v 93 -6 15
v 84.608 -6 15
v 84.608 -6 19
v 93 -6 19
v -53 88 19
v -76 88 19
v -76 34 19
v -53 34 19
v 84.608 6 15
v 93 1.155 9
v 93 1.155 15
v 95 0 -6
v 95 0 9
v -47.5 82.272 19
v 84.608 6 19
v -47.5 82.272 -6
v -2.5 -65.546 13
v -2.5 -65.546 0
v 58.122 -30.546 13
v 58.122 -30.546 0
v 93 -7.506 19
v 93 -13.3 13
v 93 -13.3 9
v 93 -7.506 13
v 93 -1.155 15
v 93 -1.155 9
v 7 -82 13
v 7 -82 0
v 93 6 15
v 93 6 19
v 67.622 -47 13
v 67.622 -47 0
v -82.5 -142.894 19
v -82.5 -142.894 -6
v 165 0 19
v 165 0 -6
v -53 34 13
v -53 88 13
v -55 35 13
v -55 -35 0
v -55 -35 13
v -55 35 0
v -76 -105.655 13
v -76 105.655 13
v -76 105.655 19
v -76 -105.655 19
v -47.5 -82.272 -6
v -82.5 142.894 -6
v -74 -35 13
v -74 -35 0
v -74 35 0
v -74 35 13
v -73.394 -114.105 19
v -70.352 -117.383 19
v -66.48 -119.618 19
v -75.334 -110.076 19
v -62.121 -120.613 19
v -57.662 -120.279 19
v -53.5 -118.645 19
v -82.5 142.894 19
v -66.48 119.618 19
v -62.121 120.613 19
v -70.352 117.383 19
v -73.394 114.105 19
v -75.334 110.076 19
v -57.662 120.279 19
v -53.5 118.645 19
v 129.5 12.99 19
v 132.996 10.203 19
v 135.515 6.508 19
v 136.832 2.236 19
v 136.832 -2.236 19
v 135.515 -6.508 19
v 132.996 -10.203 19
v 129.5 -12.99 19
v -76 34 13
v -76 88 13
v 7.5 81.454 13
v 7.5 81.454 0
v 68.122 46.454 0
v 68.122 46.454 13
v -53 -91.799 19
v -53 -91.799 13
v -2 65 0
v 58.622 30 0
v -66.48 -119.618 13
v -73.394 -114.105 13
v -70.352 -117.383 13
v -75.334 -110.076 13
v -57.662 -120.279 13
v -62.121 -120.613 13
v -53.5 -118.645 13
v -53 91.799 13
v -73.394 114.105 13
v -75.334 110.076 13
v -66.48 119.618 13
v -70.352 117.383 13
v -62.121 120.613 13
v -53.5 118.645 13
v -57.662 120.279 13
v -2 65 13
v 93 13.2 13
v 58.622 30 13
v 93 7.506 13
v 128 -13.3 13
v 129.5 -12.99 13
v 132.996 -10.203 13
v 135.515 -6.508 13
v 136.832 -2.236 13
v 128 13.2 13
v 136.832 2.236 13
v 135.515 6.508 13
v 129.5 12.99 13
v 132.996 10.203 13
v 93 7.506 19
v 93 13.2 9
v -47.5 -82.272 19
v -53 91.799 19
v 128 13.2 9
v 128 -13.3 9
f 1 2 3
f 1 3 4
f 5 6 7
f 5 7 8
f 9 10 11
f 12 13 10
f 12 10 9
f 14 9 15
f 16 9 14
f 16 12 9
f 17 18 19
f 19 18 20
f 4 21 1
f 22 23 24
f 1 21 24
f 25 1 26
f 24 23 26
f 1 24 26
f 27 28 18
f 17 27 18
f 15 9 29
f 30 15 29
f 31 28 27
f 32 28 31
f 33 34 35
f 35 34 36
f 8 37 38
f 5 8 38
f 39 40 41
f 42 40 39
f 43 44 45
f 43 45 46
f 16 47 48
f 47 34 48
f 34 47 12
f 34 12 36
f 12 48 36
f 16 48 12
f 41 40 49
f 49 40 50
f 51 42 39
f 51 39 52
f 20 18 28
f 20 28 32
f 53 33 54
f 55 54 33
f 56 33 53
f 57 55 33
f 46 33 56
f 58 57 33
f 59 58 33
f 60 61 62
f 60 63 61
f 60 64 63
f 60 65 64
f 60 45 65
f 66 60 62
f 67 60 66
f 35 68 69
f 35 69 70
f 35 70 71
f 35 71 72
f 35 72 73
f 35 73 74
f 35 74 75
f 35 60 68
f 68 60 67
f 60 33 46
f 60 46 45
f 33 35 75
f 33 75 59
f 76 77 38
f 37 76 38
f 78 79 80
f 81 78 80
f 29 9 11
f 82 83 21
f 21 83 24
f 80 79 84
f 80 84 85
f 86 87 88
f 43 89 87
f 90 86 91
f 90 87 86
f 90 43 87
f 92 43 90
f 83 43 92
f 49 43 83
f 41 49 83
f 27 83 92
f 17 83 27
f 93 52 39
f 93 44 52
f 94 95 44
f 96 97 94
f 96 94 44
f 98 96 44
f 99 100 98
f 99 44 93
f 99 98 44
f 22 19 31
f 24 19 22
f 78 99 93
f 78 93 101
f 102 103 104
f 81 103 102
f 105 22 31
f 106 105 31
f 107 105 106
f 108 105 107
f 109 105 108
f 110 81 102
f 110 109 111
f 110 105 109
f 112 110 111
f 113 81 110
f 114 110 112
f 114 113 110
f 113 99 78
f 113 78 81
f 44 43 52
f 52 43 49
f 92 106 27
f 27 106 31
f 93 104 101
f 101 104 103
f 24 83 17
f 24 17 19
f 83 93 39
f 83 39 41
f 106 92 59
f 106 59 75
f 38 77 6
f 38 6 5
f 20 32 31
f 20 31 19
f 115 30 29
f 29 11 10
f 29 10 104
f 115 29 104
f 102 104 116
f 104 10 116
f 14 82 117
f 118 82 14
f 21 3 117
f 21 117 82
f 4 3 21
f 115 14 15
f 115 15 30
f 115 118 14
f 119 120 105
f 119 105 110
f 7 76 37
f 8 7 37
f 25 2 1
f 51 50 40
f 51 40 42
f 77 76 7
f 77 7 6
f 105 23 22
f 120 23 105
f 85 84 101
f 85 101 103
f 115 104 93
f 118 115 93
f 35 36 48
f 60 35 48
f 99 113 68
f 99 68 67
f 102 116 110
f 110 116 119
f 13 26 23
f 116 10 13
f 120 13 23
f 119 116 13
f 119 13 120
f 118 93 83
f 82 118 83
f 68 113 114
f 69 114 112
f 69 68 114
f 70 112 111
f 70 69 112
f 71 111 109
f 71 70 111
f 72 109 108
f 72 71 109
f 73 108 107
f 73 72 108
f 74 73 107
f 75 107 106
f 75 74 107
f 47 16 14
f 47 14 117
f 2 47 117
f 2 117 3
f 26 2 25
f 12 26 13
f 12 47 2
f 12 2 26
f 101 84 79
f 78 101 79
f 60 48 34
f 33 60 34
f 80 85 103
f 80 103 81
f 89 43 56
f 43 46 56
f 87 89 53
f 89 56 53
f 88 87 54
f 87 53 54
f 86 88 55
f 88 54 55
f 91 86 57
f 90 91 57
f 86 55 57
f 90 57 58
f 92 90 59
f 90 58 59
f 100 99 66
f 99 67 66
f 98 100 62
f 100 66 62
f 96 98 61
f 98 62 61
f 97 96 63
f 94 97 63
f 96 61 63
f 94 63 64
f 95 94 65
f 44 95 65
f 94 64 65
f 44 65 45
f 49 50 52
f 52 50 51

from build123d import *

# Parameters (mm, degrees)
BOX005_W               = 23
BOX005_H               = 54
BOX005_DEPTH           = 6
PRISM003_DEPTH         = 6
PRISM002_DEPTH         = 6
BOX004_W               = 10
BOX004_H               = 12
BOX004_DEPTH           = 4
BOX003_W               = 35
BOX003_H               = 26.5
BOX003_DEPTH           = 10
BOX002_W               = 70
BOX002_H               = 19
BOX002_DEPTH           = 19
BOX002_PLACEMENT_ANGLE = 30
BOX001_W               = 70
BOX001_H               = 19
BOX001_DEPTH           = 19
BOX001_PLACEMENT_ANGLE = 90
BOX_W                  = 70
BOX_H                  = 19
BOX_DEPTH              = 19
BOX_PLACEMENT_ANGLE    = 30
PRISM001_DEPTH         = 25
PRISM_DEPTH            = 25
FILLET_R               = 15


with BuildPart() as box005:
    # Box005 → Box005 (new body)
    with BuildSketch(Plane(origin=(-76, 34, 13), x_dir=(1, 0, 0), z_dir=(0, 0, 1))):
        with Locations((11.5, 27)):
            Rectangle(BOX005_W, BOX005_H)
    extrude(amount=BOX005_DEPTH)


with BuildPart() as prism003:
    # Prism003 → Prism003 (new body)
    with BuildSketch(Plane.XY.offset(13)):
        Polygon((106, 0), (-53, 91.798693), (-53, -91.798693), align=None)
    extrude(amount=PRISM003_DEPTH)


with BuildPart() as cut006:
    # Prism002 → Prism002 (new body)
    with BuildSketch(Plane.XY.offset(13)):
        Polygon((152, 0), (-76, 131.635861), (-76, -131.635861), align=None)
    extrude(amount=PRISM002_DEPTH)

    # Cut006: cut Prism003
    add(prism003.part, mode=Mode.SUBTRACT)


with BuildPart() as box004:
    # Box004 → Box004 (new body)
    with BuildSketch(Plane(origin=(84, -6, 15), x_dir=(1, 0, 0), z_dir=(0, 0, 1))):
        with Locations((5, 6)):
            Rectangle(BOX004_W, BOX004_H)
    extrude(amount=BOX004_DEPTH)


with BuildPart() as box003:
    # Box003 → Box003 (new body)
    with BuildSketch(Plane(origin=(93, -13.3, 9), x_dir=(1, 0, 0), z_dir=(0, 0, 1))):
        with Locations((17.5, 13.25)):
            Rectangle(BOX003_W, BOX003_H)
    extrude(amount=BOX003_DEPTH)


with BuildPart() as box002:
    # Box002 → Box002 (new body)
    with BuildSketch(Plane.XY):
        with Locations((35, 9.5)):
            Rectangle(BOX002_W, BOX002_H)
    extrude(amount=BOX002_DEPTH)


with BuildPart() as box002_1:
    # Box002 placement: moved
    add(box002.part.moved(Location((7, -82, 0))).rotate(Axis((7, -82, 0), (0, 0, 1)), BOX002_PLACEMENT_ANGLE))


with BuildPart() as box001:
    # Box001 → Box001 (new body)
    with BuildSketch(Plane.XY):
        with Locations((35, 9.5)):
            Rectangle(BOX001_W, BOX001_H)
    extrude(amount=BOX001_DEPTH)


with BuildPart() as box001_1:
    # Box001 placement: moved
    add(box001.part.moved(Location((-55, -35, 0))).rotate(Axis((-55, -35, 0), (0, 0, 1)), BOX001_PLACEMENT_ANGLE))


with BuildPart() as box:
    # Box → Box (new body)
    with BuildSketch(Plane.XY):
        with Locations((35, 9.5)):
            Rectangle(BOX_W, BOX_H)
    extrude(amount=BOX_DEPTH)


with BuildPart() as box_1:
    # Box placement: moved
    add(box.part.moved(Location((-2, 65, 0))).rotate(Axis((-2, 65, 0), (0, 0, -1)), BOX_PLACEMENT_ANGLE))


with BuildPart() as prism001:
    # Prism001 → Prism001 (new body)
    with BuildSketch(Plane.XY.offset(-6)):
        Polygon((95, 0), (-47.5, 82.272413), (-47.5, -82.272413), align=None)
    extrude(amount=PRISM001_DEPTH)


with BuildPart() as fillet_body:
    # Prism → Prism (new body)
    with BuildSketch(Plane.XY.offset(-6)):
        Polygon((165, 0), (-82.5, 142.894192), (-82.5, -142.894192), align=None)
    extrude(amount=PRISM_DEPTH)

    # Cut: cut Prism001
    add(prism001.part, mode=Mode.SUBTRACT)

    # Cut001: cut Box
    add(box_1.part, mode=Mode.SUBTRACT)

    # Cut002: cut Box001
    add(box001_1.part, mode=Mode.SUBTRACT)

    # Cut003: cut Box002
    add(box002_1.part, mode=Mode.SUBTRACT)

    # Cut004: cut Box003
    add(box003.part, mode=Mode.SUBTRACT)

    # Cut005: cut Box004
    add(box004.part, mode=Mode.SUBTRACT)

    # Cut007: cut Cut006
    add(cut006.part, mode=Mode.SUBTRACT)

    # Fillet
    fillet_edges = [fillet_body.edges().sort_by_distance(p)[0] for p in [
        (152, 0, 16),
        (-76, 131.635861, 16),
        (-76, -131.635861, 16),
    ]]
    fillet(fillet_edges, radius=FILLET_R)


solid = Compound([box005.part, fillet_body.part])
